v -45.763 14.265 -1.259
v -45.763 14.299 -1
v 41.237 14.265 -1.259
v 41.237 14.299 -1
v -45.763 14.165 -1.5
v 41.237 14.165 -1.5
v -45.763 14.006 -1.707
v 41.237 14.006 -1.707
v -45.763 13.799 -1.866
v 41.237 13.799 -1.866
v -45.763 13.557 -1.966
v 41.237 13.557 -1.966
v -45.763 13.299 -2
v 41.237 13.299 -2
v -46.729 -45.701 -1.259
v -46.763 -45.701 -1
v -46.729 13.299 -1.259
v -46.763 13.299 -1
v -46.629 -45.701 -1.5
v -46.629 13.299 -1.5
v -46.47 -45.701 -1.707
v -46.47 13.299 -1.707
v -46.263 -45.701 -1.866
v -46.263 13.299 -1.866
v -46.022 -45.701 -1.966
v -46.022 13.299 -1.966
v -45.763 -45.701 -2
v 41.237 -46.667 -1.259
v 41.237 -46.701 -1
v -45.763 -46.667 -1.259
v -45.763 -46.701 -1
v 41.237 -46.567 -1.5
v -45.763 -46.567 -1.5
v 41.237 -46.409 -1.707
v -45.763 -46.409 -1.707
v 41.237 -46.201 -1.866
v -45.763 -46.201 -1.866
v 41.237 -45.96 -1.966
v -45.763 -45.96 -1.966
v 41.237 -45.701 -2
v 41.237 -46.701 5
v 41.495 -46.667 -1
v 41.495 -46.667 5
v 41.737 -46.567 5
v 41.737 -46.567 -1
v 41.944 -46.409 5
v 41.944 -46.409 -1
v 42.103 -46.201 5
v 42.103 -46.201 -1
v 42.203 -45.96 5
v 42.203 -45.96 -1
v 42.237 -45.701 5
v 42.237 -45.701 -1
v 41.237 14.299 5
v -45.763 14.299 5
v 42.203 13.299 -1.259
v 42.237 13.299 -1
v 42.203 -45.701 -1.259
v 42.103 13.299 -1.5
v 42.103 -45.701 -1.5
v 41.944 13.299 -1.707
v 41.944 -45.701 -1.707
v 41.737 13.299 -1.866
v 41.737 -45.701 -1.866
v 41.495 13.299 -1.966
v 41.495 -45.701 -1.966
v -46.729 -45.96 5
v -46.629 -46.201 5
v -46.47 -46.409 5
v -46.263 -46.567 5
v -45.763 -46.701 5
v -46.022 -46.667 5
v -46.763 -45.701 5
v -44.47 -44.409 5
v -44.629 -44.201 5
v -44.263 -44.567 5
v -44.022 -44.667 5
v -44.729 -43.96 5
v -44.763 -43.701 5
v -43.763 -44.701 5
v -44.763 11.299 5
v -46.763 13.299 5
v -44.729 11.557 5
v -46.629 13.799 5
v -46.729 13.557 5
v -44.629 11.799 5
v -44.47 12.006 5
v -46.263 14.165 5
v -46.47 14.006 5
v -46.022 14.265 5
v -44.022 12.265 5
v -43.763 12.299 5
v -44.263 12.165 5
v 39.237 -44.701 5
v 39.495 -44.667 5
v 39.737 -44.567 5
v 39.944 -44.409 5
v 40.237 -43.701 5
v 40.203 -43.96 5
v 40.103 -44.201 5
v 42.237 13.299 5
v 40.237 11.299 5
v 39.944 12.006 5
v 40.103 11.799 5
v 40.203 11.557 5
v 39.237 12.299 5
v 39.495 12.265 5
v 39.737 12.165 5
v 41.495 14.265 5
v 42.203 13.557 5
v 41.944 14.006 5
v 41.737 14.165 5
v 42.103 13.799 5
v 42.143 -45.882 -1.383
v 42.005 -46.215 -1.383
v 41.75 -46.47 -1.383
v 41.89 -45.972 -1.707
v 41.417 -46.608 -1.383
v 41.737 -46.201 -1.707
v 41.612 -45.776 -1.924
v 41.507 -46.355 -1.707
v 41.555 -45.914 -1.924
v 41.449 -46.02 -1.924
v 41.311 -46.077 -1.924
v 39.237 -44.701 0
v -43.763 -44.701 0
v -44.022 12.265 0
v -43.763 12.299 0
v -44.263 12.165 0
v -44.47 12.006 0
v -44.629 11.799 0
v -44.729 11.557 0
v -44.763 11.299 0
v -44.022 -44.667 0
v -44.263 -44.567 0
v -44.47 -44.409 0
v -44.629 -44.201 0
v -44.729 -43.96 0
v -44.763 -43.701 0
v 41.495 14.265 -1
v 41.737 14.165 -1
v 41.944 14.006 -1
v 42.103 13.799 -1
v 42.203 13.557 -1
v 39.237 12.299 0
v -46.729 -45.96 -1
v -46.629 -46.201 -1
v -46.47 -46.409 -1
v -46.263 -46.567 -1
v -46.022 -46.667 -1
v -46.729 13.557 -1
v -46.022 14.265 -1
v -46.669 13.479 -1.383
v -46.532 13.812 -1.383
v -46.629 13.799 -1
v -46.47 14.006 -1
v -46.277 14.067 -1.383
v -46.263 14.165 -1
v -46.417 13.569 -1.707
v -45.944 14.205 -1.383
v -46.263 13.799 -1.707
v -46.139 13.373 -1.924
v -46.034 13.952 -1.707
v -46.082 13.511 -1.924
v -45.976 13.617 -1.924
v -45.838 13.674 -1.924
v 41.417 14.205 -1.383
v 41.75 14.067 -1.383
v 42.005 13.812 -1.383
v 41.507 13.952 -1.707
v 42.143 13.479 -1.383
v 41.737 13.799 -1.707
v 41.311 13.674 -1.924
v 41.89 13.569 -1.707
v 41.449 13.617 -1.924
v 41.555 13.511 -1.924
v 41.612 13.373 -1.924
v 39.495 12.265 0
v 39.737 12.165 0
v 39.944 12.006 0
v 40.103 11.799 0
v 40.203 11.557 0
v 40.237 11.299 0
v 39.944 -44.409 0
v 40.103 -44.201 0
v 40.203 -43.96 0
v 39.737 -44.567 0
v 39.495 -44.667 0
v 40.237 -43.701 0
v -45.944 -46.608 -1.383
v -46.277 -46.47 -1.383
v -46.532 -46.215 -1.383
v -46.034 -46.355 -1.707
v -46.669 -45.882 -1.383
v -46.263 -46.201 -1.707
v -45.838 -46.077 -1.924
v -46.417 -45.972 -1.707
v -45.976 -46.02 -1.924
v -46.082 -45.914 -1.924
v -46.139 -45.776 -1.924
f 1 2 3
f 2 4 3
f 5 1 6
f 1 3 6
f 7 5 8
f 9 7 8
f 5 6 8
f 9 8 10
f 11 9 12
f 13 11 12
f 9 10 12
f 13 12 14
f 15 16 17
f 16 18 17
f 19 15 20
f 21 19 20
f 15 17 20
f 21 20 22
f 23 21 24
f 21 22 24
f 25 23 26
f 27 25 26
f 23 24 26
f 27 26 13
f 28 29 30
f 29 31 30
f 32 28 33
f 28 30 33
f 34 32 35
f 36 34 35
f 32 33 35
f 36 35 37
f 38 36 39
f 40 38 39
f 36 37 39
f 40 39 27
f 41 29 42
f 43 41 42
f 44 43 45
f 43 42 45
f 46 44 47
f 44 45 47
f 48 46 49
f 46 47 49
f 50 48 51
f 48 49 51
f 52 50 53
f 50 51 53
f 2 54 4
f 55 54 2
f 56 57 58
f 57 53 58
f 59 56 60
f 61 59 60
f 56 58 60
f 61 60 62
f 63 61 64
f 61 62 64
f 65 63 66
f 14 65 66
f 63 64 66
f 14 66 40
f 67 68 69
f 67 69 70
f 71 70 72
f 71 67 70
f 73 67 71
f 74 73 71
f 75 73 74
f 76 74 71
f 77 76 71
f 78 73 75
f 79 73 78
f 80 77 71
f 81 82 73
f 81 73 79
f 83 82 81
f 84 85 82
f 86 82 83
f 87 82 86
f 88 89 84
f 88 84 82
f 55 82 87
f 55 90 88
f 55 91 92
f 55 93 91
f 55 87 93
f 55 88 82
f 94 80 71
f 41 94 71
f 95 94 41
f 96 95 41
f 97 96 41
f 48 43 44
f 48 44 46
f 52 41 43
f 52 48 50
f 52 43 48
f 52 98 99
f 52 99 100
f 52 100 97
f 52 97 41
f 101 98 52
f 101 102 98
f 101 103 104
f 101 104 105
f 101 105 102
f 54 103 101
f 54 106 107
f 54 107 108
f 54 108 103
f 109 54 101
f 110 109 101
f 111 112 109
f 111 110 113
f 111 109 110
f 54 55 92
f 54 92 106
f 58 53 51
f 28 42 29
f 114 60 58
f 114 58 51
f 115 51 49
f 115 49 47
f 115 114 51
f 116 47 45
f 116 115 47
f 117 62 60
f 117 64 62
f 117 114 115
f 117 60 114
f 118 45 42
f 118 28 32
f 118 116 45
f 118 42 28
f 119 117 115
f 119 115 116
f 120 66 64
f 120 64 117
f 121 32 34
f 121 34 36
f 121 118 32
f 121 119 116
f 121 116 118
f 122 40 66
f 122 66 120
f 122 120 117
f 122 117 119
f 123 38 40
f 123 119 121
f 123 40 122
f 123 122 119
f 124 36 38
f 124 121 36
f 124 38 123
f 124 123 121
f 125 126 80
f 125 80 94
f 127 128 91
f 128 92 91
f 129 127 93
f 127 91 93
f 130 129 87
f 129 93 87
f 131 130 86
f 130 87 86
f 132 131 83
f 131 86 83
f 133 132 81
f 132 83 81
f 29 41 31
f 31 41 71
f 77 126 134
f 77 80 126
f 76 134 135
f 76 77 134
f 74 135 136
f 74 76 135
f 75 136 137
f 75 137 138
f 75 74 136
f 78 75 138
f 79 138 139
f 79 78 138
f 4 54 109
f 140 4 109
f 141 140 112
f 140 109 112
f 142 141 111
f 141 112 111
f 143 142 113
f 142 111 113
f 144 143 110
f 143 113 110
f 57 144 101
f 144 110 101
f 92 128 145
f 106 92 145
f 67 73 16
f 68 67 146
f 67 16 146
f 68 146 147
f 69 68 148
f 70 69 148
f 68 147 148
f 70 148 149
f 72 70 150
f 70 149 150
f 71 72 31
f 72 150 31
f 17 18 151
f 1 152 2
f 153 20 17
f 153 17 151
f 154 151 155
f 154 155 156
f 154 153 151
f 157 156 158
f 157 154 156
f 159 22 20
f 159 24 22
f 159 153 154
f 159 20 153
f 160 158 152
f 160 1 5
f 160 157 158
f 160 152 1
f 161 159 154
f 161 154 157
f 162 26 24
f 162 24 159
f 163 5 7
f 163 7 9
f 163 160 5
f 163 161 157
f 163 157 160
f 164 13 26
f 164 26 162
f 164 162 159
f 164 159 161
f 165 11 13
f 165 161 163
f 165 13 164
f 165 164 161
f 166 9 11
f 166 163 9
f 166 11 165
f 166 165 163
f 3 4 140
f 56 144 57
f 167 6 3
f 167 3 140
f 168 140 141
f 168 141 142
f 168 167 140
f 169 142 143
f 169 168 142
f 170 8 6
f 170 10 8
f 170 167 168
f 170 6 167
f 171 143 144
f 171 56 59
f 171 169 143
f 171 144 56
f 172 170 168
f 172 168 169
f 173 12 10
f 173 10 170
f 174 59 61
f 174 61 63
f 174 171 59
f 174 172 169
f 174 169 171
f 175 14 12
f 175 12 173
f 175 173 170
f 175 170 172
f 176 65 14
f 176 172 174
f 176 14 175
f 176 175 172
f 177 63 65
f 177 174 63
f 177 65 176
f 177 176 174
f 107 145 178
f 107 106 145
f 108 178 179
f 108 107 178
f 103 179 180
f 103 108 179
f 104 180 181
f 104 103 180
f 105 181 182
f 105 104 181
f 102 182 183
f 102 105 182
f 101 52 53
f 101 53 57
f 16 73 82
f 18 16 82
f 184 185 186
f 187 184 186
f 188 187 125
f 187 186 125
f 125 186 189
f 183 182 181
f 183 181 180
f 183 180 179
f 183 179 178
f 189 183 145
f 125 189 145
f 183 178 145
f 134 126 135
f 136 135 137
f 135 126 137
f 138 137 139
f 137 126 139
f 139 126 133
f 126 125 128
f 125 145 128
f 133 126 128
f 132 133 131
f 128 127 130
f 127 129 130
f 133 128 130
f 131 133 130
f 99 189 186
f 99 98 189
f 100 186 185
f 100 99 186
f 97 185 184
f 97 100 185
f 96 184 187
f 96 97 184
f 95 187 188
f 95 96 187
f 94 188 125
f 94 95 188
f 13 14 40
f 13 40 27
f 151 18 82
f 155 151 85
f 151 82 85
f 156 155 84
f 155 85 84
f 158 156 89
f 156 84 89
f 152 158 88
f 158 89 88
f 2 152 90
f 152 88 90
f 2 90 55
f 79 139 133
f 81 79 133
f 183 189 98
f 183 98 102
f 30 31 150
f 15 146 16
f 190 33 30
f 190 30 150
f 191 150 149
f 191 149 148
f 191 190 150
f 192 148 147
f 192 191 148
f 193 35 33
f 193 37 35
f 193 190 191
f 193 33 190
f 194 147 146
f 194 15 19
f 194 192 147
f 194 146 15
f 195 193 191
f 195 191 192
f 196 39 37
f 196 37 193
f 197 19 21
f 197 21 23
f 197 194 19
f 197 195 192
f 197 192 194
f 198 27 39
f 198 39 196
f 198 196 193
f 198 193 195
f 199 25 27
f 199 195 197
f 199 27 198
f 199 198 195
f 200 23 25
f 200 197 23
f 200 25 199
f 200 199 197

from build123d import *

# Parameters (mm, degrees)
ESBO_O1_W                = 89
ESBO_O1_H                = 61
ESBO_O1_W_2              = 85
ESBO_O1_H_2              = 57
RESSALTO_EXTRUS_O1_DEPTH = 5
ESBO_O2_W                = 89
ESBO_O2_H                = 61
RESSALTO_EXTRUS_O2_DEPTH = 2
FILETE6_R                = 1
FILETE7_R                = 1
FILETE10_R               = 1
FILETE11_R               = 1
FILETE12_R               = 1


with BuildPart() as part:
    # Esboço1 → Ressalto-extrusão1 (new body)
    with BuildSketch(Plane.XY):
        with Locations((-2.263340114, -16.201421801)):
            Rectangle(ESBO_O1_W, ESBO_O1_H)
        with Locations((-2.263340114, -16.201421801)):
            Rectangle(ESBO_O1_W_2, ESBO_O1_H_2, mode=Mode.SUBTRACT)
    extrude(amount=RESSALTO_EXTRUS_O1_DEPTH)

    # Esboço2 → Ressalto-extrusão2 (add)
    with BuildSketch(Plane(origin=(0, 0, 0), x_dir=(-1, 0, 0), z_dir=(0, 0, -1))):
        with Locations((2.263340114, -16.201421801)):
            Rectangle(ESBO_O2_W, ESBO_O2_H)
    extrude(amount=RESSALTO_EXTRUS_O2_DEPTH)

    # Filete6
    filete6_edges = [part.edges().sort_by_distance(p)[0] for p in [
        (40.236659886, 12.298578199, 2.5),
    ]]
    fillet(filete6_edges, radius=FILETE6_R)

    # Filete7
    filete7_edges = [part.edges().sort_by_distance(p)[0] for p in [
        (-44.763340114, 12.298578199, 2.5),
        (-44.763340114, -44.701421801, 2.5),
        (40.236659886, -44.701421801, 2.5),
    ]]
    fillet(filete7_edges, radius=FILETE7_R)

    # Filete10
    filete10_edges = [part.edges().sort_by_distance(p)[0] for p in [
        (-46.763340114, -46.701421801, 1.5),
    ]]
    fillet(filete10_edges, radius=FILETE10_R)

    # Filete11
    filete11_edges = [part.edges().sort_by_distance(p)[0] for p in [
        (-46.763340114, 14.298578199, 1.5),
        (42.236659886, 14.298578199, 1.5),
        (42.236659886, -46.701421801, 1.5),
    ]]
    fillet(filete11_edges, radius=FILETE11_R)

    # Filete12
    filete12_edges = [part.edges().sort_by_distance(p)[0] for p in [
        (-46.763340114, -16.201421801, -2),
        (-46.470446895, -46.408528582, -2),
        (42.236659886, -16.201421801, -2),
        (-2.263340114, -46.701421801, -2),
        (-2.263340114, 14.298578199, -2),
        (-46.470446895, 14.00568498, -2),
        (41.943766667, 14.00568498, -2),
        (41.943766667, -46.408528582, -2),
    ]]
    fillet(filete12_edges, radius=FILETE12_R)


solid = part.part
